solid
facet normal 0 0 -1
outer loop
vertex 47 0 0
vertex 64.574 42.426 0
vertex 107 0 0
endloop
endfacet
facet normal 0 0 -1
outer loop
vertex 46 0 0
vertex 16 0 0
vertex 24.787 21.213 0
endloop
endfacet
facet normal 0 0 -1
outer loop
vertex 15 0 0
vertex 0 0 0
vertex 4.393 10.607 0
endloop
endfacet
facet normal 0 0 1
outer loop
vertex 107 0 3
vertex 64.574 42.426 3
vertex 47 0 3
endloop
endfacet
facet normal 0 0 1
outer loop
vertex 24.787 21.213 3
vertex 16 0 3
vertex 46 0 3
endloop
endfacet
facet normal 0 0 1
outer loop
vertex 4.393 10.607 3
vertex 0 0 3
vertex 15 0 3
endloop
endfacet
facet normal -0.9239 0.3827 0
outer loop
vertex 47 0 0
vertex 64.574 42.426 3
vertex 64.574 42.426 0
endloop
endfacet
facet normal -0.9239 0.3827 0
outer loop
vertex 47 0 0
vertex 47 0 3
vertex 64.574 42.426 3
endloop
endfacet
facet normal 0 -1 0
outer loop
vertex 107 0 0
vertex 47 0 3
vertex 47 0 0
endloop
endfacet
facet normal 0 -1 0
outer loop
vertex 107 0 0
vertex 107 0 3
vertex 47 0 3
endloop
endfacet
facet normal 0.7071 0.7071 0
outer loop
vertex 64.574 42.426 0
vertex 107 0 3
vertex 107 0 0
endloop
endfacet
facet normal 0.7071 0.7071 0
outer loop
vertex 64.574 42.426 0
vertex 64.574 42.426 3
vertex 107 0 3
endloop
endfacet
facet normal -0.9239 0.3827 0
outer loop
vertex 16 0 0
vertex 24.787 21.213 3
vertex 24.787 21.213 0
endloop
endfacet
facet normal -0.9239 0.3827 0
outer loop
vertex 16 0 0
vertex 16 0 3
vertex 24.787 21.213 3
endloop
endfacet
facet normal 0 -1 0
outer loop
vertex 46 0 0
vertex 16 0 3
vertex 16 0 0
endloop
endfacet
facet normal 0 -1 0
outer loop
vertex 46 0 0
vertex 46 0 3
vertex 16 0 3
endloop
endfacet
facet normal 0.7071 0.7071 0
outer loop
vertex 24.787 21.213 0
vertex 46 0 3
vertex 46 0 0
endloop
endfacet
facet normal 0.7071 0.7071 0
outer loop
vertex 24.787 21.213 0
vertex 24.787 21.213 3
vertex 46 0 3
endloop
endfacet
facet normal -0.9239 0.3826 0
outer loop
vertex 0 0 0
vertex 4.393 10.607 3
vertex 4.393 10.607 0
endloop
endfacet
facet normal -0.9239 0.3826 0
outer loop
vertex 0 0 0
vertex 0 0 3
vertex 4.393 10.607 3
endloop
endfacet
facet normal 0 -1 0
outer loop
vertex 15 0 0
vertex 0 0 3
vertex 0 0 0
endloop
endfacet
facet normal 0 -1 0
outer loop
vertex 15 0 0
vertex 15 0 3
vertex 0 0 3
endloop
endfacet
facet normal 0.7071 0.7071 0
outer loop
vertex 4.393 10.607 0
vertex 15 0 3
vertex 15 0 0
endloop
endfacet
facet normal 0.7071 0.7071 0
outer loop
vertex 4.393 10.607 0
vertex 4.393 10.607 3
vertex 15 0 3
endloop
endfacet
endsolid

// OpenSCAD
//Program TriangleSolver.scad
// (c) Rich Cameron 2020, licensed CC-BY 
// All dimensions mm 

thick = 3; //How thick the triangle is in the 3rd dimension

trianglebase = 30; //Make this larger if scaleset triangles overlap. 
// Should be equal to the base side of the triangle.

// Four options for specifying triangle are
// side-side-side (sides in mm)
//sss(10, 10, 10); 
// side-angle-side (sides in mm, angle in degrees)
//sas(10, 60, 10);
// angle-side-angle(side in mm, angles in degrees)
//asa(60, 10, 60);
// side-angle-angle(side in mm, angles in degrees)
//saa(10, 60, 60);
// First side dimension given is used as the base

// the next line uses side-side-side to create three scaled triangles.
// Parameters in scaled brackets are the scaling factor 
// from the original triangle
// replace "sas" with one of the above alternatives if desired
// If you give it a geometrically-impossible set of parameters it will
// do nothing

thicken() scaleset(trianglebase, [.5, 1, 2]) sas(30, 45, 30); 
		
module thicken() if(thick) linear_extrude(thick) children();
	else children();

module scaleset(base, sizes = [1, 2]) for(i = [0:len(sizes) - 1]) translate([base * sum(sizes, i - 1) + i, 0, 0]) scale([sizes[i], sizes[i], 1]) children();
	
function sum(v, i) = (i >= 0) ? v[i] + sum(v, i-1) : 0;


module triangle(angleA = 0, sideB = 0, angleC = 0, sideA = 0, angleB = 0, sideC = 0) {
	if(((angleA ? 1 : 0) + (sideB ? 1 : 0) + (angleC ? 1 : 0) + (sideA ? 1 : 0) + (angleB ? 1 : 0) + (sideC ? 1 : 0)) > 3) 
		echo(str("Triangle with ",
			angleA ? str("angleA = " , angleA, ", ") : "",
			sideB ? str("sideB = " , sideB, ", ") : "",
			angleC ? str("angleC = " , angleC, ", ") : "",
			sideA ? str("sideA = " , sideA, ", ") : "",
			angleB ? str("angleB = " , angleB, ", ") : "",
			sideC ? str("sideC = " , sideC, ", ") : "",
			"is over-constrained."
		));
	
	else if(((angleA ? 1 : 0) + (sideB ? 1 : 0) + (angleC ? 1 : 0) + (sideA ? 1 : 0) + (angleB ? 1 : 0) + (sideC ? 1 : 0)) < 3) 
		echo(str("Triangle with ",
			angleA ? str("angleA = " , angleA, ", ") : "",
			sideB ? str("sideB = " , sideB, ", ") : "",
			angleC ? str("angleC = " , angleC, ", ") : "",
			sideA ? str("sideA = " , sideA, ", ") : "",
			angleB ? str("angleB = " , angleB, ", ") : "",
			sideC ? str("sideC = " , sideC, ", ") : "",
			"is under-constrained."
		));
	
	else if(!angleA && sideB && !angleC && sideA && !angleB && sideC) sss(sideA, sideB, sideC);
	
	else if(angleA && sideB && angleC && !sideA && !angleB && !sideC) asa(angleA, sideB, angleC);
	else if(!angleA && !sideB && angleC && sideA && angleB && !sideC) asa(angleC, sideA, angleB);
	else if(angleA && !sideB && !angleC && !sideA && angleB && sideC) asa(angleB, sideC, angleA);
	
	else if(!angleA && sideB && angleC && sideA && !angleB && !sideC) sas(sideB, angleC, sideA);
	else if(!angleA && !sideB && !angleC && sideA && angleB && sideC) sas(sideA, angleB, sideC);
	else if(angleA && sideB && !angleC && !sideA && !angleB && sideC) sas(sideC, angleA, sideB);
	
	else if(!angleA && sideB && angleC && !sideA && angleB && !sideC) saa(sideB, angleC, angleB);
	else if(angleA && !sideB && !angleC && sideA && angleB && !sideC) saa(sideA, angleB, angleA);
	else if(angleA && !sideB && angleC && !sideA && !angleB && sideC) saa(sideC, angleA, angleC);
		
	else if(!angleA && !sideB && angleC && !sideA && angleB && sideC)
		translate([sideC, 0, 0]) mirror([1, 0, 0]) saa(sideC, angleC, angleB);
	else if(angleA && sideB && !angleC && !sideA && angleB && !sideC)
		translate([sideB, 0, 0]) mirror([1, 0, 0]) saa(sideB, angleB, angleA);
	else if(angleA && !sideB && angleC && AsideA && !angleB && !sideC)
		translate([sideA, 0, 0]) mirror([1, 0, 0]) saa(sideA, angleA, angleC);
	
	else echo(str("Triangle with ",
			angleA ? str("angleA = " , angleA, ", ") : "",
			sideB ? str("sideB = " , sideB, ", ") : "",
			angleC ? str("angleC = " , angleC, ", ") : "",
			sideA ? str("sideA = " , sideA, ", ") : "",
			angleB ? str("angleB = " , angleB, ", ") : "",
			sideC ? str("sideC = " , sideC, ", ") : "",
		"is not properly constrained."
	));
}

module sss(sideB, sideA, sideC) {
	polygon([
		[0, 0],
		[sideB, 0],
		[
			sideB - (((pow(sideA, 2) + pow(sideB, 2) - pow(sideC, 2)) / 2 / sideA / sideB)) * sideA,
			sin(acos((pow(sideA, 2) + pow(sideB, 2) - pow(sideC, 2)) / 2 / sideA / sideB)) * sideA
		]
	]);
	echo(str(
		"angles: ", 
		acos((pow(sideB, 2) + pow(sideC, 2) - pow(sideA, 2)) / 2 / sideB / sideC),
		", ", 
		acos((pow(sideA, 2) + pow(sideC, 2) - pow(sideB, 2)) / 2 / sideA / sideC),
		", ", 
		acos((pow(sideA, 2) + pow(sideB, 2) - pow(sideC, 2)) / 2 / sideA / sideB)
	));
	echo(str(
		"sides: ",
		sideA,
		", ",
		sideB,
		", ",
		sideC
	));
}

module sas(sideB, angleC, sideA) {
	polygon([
		[0, 0],
		[sideB, 0],
		[
			sideB - cos(angleC) * sideA,
			sin(angleC) * sideA
		]
	]);
	echo(str(
		"angles: ", 
		asin(sin(angleC) * sideA / sqrt(pow(sideA, 2) + pow(sideB, 2) - 2 * sideA * sideB * cos(angleC))),
		", ", 
		asin(sin(angleC) * sideB / sqrt(pow(sideA, 2) + pow(sideB, 2) - 2 * sideA * sideB * cos(angleC))),
		", ", 
		angleC
	));
	echo(str(
		"sides: ",
		sideA,
		", ",
		sideB,
		", ",
		sqrt(pow(sideA, 2) + pow(sideB, 2) - 2 * sideA * sideB * cos(angleC))
	));
}

module asa(angleA, sideB, angleC) {
	polygon([
		[0, 0],
		[sideB, 0],
		[
			sideB - cos(angleC) * sideB * sin(angleA) / sin(180 - angleA - angleC),
			sin(angleC) * sideB * sin(angleA) / sin(180 - angleA - angleC),
		]
	]);
	echo(str(
		"angles: ",
		angleA, 
		", ", 
		180 - angleA - angleC, 
		", ", 
		angleC
	));
	echo(str(
		"sides: ",
		sideB * sin(angleA) / sin(180 - angleA - angleC),
		", ",
		sideB,
		", ",
		sideB * sin(angleC) / sin(180 - angleA - angleC)
	));
}

module saa(sideB, angleC, angleB) {
	polygon([
		[0, 0],
		[sideB, 0],
		[
			sideB - cos(angleC) * sideB * sin(180 - angleC - angleB) / sin(angleB),
			sin(angleC) * sideB * sin(180 - angleC - angleB) / sin(angleB),
		]
	]);
	echo(str(
		"angles: ",
		180 - angleC - angleB,
		", ",
		angleB,
		", ",
		angleC
	));
	echo(str(
		"sides: ",
		sideB * sin(180 - angleC - angleB) / sin(angleB),
		", ",
		sideB,
		", ",
		sideB * sin(angleC) / sin(angleB)
	));
}
